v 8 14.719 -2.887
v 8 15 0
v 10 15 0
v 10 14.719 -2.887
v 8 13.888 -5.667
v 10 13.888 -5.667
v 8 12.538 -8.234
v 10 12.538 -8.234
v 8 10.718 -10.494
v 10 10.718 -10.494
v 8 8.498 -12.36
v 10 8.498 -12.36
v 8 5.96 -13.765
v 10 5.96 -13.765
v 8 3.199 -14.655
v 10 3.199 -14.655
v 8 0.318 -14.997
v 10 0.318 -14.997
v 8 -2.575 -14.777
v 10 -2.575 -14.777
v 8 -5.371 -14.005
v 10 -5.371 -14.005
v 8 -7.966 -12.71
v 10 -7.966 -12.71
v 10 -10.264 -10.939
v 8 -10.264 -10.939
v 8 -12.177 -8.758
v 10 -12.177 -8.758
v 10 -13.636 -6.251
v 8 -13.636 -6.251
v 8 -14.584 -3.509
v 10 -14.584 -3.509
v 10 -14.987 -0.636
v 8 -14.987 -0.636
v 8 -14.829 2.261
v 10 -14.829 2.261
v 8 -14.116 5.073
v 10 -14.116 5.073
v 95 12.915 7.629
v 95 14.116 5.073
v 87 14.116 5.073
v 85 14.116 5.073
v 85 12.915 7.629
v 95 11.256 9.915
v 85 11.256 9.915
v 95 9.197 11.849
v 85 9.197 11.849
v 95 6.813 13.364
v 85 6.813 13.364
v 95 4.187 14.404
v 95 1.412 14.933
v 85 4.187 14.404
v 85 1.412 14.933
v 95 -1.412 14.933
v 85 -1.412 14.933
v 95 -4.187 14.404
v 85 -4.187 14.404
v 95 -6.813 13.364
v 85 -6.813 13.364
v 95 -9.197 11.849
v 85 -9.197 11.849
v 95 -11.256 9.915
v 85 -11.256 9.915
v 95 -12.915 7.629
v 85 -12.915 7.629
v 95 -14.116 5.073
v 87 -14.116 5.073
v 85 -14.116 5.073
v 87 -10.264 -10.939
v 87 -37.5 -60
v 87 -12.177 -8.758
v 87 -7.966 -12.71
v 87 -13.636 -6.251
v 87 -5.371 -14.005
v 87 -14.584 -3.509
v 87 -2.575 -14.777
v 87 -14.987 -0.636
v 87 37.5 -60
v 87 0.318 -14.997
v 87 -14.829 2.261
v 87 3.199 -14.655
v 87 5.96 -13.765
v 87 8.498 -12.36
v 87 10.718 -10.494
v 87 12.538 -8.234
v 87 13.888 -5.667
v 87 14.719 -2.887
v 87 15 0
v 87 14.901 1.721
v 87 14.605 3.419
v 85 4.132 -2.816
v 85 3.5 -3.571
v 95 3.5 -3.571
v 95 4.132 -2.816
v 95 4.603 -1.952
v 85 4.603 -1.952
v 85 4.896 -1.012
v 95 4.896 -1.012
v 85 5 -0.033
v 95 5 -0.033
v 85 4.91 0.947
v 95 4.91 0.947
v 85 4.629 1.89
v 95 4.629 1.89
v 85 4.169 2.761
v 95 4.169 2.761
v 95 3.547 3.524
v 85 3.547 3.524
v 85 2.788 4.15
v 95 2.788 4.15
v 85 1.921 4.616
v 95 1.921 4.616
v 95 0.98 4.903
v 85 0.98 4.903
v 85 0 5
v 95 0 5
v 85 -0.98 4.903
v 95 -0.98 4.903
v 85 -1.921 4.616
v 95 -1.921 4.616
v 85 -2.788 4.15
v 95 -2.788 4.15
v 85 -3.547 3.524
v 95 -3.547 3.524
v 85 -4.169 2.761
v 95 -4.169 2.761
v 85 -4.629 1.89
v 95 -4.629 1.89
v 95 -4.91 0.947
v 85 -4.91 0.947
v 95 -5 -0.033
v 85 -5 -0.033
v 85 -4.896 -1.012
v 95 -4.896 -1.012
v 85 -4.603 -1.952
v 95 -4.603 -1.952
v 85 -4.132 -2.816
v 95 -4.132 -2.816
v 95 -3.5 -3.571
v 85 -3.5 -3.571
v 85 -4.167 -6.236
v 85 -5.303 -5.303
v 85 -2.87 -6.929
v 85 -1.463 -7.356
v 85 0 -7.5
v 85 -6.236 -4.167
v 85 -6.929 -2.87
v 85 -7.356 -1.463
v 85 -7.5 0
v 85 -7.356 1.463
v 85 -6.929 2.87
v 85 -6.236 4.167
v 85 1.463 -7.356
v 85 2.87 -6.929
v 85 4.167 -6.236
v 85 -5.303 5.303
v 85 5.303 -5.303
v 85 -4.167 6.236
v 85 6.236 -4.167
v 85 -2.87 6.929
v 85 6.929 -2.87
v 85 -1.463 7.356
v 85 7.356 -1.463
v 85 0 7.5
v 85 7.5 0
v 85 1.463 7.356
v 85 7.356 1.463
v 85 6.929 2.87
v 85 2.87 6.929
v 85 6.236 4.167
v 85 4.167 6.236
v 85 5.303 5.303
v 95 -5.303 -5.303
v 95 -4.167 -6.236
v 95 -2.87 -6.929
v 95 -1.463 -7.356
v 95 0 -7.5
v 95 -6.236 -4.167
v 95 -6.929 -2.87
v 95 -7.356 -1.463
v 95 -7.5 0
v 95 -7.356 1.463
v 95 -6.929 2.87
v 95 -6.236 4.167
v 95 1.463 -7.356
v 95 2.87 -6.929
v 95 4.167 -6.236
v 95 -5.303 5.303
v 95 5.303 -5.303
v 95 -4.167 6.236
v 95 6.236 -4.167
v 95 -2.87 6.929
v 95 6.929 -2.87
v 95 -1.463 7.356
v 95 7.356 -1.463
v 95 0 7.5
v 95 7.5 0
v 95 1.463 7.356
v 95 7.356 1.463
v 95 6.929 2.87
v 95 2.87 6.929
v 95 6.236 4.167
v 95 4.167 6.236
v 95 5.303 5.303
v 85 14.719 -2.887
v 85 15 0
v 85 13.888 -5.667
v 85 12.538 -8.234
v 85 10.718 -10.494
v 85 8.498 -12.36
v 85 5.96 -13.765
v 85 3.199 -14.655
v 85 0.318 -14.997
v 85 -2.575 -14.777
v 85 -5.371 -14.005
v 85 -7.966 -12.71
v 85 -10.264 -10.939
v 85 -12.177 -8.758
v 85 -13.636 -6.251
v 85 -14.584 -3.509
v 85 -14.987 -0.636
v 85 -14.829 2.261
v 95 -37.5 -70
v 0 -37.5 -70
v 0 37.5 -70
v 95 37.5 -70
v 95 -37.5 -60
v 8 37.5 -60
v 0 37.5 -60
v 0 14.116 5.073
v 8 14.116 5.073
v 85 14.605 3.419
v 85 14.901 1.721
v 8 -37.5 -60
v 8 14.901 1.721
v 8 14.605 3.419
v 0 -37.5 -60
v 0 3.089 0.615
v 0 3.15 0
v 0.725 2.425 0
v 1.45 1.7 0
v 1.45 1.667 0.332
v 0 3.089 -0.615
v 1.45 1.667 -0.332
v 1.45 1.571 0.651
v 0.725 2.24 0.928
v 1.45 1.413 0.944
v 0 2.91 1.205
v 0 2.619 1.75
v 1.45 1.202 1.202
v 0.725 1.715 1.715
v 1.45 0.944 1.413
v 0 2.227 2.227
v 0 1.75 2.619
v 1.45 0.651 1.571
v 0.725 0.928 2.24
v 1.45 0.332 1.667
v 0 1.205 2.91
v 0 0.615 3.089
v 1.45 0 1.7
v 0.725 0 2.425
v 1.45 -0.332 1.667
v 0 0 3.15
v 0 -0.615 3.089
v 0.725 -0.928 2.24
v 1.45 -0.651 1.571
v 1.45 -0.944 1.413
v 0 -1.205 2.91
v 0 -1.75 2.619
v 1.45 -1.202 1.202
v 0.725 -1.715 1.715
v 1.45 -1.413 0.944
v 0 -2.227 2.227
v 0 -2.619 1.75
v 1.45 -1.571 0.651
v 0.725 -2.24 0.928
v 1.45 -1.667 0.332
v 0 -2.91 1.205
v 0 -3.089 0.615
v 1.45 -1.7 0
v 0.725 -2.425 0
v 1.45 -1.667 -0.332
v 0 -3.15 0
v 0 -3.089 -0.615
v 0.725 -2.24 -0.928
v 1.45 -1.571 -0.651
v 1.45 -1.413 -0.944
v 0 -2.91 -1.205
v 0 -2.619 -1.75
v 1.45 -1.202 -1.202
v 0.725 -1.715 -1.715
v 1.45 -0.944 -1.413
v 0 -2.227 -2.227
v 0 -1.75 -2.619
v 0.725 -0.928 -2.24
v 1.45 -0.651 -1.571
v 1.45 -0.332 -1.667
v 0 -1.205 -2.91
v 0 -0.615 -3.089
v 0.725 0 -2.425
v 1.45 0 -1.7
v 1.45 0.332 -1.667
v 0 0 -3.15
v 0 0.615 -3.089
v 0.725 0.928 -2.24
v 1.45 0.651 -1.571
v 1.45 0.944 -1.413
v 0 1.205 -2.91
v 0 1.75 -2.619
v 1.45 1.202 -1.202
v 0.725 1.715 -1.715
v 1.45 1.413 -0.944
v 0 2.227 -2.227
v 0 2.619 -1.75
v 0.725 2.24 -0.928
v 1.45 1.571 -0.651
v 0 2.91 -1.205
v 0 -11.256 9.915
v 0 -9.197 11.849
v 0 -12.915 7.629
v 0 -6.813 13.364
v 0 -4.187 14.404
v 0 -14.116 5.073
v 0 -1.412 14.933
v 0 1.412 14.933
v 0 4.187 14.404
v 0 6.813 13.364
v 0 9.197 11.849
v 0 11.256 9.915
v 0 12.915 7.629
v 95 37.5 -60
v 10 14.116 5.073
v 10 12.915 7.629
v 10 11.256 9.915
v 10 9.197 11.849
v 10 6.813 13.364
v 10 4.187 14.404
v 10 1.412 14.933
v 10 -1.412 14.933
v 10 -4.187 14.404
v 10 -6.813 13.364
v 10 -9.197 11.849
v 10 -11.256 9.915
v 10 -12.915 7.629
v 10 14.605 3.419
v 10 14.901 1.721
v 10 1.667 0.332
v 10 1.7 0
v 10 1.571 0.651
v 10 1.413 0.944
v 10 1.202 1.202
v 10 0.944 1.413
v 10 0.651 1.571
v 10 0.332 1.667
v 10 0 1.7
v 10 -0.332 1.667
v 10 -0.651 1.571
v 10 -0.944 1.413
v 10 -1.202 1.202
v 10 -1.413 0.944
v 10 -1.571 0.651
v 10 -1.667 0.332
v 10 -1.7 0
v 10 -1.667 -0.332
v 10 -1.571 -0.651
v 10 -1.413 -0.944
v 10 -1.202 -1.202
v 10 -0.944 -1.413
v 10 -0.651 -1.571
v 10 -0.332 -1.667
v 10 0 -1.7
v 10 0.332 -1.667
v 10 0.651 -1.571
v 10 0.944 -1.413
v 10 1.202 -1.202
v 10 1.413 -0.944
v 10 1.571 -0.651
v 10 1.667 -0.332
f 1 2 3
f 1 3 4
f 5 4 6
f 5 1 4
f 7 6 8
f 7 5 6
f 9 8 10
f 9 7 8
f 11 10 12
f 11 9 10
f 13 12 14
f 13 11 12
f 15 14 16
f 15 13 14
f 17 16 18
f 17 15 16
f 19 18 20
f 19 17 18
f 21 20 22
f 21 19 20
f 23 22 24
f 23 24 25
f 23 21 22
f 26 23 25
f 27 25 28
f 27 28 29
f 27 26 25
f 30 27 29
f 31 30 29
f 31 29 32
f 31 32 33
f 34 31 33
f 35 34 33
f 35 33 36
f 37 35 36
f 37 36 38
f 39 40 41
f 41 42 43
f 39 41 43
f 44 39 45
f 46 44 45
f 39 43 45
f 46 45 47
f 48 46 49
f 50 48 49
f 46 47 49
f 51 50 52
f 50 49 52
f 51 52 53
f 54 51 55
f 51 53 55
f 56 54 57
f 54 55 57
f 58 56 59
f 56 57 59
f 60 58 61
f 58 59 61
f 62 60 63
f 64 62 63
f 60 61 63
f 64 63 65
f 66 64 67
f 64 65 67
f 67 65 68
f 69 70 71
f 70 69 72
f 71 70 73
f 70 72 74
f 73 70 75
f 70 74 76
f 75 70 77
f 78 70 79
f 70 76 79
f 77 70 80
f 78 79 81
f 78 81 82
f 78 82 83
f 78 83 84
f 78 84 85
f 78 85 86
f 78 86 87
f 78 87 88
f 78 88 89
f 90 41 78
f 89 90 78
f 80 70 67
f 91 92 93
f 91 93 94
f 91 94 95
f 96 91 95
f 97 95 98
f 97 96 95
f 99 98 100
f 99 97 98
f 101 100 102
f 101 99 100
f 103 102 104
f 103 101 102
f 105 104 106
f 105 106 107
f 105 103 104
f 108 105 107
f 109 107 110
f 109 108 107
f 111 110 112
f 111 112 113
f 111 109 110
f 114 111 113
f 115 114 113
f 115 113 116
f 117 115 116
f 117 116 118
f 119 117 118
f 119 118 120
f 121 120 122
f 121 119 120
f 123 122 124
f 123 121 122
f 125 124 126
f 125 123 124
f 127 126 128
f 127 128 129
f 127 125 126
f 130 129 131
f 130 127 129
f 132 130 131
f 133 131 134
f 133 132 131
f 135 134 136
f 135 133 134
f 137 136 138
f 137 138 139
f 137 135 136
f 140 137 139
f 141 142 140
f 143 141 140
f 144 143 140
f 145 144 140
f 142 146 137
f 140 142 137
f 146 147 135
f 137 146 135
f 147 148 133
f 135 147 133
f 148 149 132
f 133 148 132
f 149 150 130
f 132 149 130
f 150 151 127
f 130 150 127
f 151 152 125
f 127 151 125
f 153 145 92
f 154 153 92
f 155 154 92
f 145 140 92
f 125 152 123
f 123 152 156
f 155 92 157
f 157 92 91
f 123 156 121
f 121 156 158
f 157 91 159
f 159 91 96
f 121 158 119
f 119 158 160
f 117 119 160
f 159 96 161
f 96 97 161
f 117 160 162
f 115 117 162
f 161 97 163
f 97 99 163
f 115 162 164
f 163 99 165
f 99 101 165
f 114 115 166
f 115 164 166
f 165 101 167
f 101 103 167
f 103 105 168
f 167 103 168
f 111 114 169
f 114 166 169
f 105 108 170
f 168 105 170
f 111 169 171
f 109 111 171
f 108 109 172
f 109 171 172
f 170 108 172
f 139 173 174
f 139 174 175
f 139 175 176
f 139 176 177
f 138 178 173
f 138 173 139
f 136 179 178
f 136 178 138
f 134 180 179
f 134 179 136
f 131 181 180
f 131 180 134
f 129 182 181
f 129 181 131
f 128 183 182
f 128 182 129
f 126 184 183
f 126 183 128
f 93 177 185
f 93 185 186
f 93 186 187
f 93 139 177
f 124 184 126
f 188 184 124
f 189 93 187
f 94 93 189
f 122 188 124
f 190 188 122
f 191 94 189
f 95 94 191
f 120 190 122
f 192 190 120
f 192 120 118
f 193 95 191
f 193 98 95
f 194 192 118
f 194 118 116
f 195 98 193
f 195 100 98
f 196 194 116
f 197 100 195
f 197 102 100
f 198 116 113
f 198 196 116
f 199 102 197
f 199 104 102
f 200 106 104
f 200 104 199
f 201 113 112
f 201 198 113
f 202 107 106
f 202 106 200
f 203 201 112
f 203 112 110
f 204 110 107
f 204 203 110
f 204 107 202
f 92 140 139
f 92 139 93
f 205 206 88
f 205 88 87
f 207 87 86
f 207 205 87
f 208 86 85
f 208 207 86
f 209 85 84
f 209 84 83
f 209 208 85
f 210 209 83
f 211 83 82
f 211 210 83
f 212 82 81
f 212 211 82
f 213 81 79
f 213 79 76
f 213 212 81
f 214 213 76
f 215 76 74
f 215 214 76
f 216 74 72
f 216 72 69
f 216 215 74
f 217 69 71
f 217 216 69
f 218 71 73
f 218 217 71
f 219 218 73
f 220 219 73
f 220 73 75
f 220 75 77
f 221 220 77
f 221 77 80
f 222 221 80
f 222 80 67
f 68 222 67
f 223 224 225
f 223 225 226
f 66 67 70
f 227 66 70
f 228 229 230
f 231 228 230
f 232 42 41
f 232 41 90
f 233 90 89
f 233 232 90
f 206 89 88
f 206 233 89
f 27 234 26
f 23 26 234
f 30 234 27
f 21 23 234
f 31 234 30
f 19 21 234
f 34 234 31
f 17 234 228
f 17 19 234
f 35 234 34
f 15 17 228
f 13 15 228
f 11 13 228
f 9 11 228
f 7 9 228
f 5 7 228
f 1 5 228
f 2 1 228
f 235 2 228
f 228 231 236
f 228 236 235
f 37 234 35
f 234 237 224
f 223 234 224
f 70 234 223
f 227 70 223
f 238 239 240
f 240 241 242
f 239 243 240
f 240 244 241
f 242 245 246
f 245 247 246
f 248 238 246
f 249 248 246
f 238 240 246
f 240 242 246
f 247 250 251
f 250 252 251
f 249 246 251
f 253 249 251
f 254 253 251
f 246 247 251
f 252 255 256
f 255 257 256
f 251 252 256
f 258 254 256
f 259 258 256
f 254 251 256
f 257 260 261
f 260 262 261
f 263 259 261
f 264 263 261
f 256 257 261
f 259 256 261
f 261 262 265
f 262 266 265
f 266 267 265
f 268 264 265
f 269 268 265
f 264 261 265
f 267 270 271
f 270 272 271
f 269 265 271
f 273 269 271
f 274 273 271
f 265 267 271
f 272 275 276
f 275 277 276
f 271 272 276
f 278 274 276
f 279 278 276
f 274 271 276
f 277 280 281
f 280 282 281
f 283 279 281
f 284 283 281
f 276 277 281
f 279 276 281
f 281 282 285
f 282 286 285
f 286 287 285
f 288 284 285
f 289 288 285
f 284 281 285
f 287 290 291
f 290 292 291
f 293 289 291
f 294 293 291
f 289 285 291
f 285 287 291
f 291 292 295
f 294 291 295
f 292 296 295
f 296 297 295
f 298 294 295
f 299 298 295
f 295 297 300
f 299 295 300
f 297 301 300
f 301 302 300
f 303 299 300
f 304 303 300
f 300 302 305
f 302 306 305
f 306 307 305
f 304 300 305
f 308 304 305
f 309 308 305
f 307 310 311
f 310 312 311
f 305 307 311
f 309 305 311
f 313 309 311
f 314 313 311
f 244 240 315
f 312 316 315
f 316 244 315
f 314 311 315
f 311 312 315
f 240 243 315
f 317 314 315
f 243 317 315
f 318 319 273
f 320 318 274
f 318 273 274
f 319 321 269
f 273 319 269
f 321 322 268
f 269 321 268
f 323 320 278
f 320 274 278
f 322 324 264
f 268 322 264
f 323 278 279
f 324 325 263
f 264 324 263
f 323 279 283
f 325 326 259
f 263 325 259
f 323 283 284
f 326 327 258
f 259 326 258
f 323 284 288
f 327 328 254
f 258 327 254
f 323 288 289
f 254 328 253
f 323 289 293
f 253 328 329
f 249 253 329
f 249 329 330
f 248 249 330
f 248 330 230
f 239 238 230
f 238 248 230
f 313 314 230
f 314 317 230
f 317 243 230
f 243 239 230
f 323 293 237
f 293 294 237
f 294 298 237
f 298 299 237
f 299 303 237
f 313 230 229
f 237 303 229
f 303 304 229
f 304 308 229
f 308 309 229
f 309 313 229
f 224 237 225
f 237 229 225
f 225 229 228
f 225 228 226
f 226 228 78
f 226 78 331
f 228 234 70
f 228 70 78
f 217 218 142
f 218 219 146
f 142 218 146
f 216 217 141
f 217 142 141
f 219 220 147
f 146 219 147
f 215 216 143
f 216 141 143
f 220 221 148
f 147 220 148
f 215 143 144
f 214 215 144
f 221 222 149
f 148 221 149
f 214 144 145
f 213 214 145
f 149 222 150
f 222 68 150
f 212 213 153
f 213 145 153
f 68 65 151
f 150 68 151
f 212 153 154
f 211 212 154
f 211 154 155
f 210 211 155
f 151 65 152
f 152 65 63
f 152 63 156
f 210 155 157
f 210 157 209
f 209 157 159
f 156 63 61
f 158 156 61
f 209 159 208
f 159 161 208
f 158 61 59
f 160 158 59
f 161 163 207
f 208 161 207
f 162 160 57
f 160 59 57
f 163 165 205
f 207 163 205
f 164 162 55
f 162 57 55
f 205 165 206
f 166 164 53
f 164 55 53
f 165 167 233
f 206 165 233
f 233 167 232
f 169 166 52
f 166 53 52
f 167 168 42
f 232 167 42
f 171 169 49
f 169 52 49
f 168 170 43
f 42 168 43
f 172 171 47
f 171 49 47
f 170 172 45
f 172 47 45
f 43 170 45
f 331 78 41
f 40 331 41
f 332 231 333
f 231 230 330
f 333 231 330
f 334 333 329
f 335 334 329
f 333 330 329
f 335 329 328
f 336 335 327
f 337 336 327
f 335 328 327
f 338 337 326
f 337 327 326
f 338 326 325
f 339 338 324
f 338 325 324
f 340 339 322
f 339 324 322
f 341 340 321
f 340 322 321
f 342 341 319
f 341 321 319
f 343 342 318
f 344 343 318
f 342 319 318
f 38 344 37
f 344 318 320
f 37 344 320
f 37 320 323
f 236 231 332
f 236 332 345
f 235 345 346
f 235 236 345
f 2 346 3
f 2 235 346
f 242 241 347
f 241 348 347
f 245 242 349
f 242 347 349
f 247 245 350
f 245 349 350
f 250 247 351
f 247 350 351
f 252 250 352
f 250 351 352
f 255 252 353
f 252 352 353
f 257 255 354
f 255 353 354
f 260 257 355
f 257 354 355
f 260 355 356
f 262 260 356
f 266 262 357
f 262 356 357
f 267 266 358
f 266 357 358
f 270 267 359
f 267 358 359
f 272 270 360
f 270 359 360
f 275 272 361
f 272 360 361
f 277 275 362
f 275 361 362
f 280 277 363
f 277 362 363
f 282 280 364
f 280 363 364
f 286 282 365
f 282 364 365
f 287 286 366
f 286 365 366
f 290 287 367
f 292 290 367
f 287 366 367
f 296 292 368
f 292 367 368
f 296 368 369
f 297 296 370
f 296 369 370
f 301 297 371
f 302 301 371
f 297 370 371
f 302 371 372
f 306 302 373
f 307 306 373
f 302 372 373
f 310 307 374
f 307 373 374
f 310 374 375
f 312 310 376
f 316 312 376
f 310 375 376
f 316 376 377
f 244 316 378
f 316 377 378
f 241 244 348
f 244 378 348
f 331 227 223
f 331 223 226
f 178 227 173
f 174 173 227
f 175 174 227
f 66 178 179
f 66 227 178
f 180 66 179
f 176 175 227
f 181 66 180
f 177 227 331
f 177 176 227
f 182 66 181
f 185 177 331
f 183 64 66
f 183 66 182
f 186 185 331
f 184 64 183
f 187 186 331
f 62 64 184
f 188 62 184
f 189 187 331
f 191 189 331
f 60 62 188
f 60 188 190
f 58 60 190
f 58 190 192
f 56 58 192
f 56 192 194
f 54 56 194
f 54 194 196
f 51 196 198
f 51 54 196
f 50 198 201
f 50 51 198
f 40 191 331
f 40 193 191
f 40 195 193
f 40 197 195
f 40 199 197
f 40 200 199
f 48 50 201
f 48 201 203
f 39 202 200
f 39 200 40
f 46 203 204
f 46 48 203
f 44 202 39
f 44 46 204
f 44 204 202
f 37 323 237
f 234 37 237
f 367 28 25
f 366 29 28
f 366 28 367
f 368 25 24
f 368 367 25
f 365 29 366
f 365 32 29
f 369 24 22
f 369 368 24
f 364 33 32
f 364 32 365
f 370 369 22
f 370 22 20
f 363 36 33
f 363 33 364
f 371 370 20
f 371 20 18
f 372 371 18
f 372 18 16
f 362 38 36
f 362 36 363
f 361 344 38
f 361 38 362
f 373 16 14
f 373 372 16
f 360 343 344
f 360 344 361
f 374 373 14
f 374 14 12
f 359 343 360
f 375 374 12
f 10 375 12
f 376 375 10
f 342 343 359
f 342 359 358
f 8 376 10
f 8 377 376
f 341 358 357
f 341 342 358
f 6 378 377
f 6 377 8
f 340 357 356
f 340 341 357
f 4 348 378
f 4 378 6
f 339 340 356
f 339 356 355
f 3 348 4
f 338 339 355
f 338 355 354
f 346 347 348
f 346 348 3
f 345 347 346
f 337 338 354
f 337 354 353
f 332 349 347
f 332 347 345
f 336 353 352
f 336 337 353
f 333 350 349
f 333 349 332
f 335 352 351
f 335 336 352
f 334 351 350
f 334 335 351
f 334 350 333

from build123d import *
from build123d.topology import SkipClean

# Parameters (mm, degrees)
SKETCH1_R                                       = 7.5
BOSS_EXTRUDE1_DEPTH                             = 10
SKETCH2_W                                       = 95
SKETCH2_H                                       = 75
BOSS_EXTRUDE2_DEPTH                             = 10
LPATTERN1_COUNT                                 = 2
LPATTERN1_PITCH                                 = 85
CUT_EXTRUDE2_DEPTH                              = 77
CUT_EXTRUDE2_DEPTH_BACK                         = 2
SKETCH5_R                                       = 7.5
SKETCH5_R_2                                     = 1
BOSS_EXTRUDE4_DEPTH                             = 10
CSK_FOR_M3_FLAT_HEAD_MACHINE_SCREW1_D           = 3.4
CSK_FOR_M3_FLAT_HEAD_MACHINE_SCREW1_DEPTH       = 95
CSK_FOR_M3_FLAT_HEAD_MACHINE_SCREW1_CSINK_D     = 6.3
CSK_FOR_M3_FLAT_HEAD_MACHINE_SCREW1_CSINK_ANGLE = 90
BOSS_EXTRUDE5_START                             = -10
SKETCH10_R                                      = 7.5
BOSS_EXTRUDE5_DEPTH                             = 10


with BuildPart() as part:
    # Sketch1 → Boss-Extrude1 (new body)
    with BuildSketch(Plane.YZ):
        with BuildLine():
            Line((-14.116239718, 5.072649824), (-37.5, -60))
            Line((-37.5, -60), (37.5, -60))
            Line((37.5, -60), (14.116239718, 5.072649824))
            ThreePointArc((14.116239718, 5.072649824), (0, 15), (-14.116239718, 5.072649824))
        make_face()
        with Locations(Location((0, 0, 0), (0, 0, 270))):
            Circle(SKETCH1_R, mode=Mode.SUBTRACT)
    boss_extrude1 = extrude(amount=BOSS_EXTRUDE1_DEPTH)

    # Sketch2 → Boss-Extrude2 (add)
    with BuildSketch(Plane(origin=(0, 0, -60), x_dir=(1, 0, 0), z_dir=(0, 0, -1))):
        with Locations((47.5, 0)):
            Rectangle(SKETCH2_W, SKETCH2_H)
    extrude(amount=BOSS_EXTRUDE2_DEPTH)

    # LPattern1: Boss-Extrude1 ×2
    with Locations(*[(i * LPATTERN1_PITCH, 0, 0) for i in range(1, LPATTERN1_COUNT)]):
        add(boss_extrude1)

    # Sketch4 → Cut-Extrude2 (cut, two sides: drawn at the far end of the back side and taken through both)
    with SkipClean():  # the faces are left unmerged after this step: merging them gives an invalid solid
        with BuildSketch(Plane.YZ.offset(10).offset(-CUT_EXTRUDE2_DEPTH_BACK)):
            with BuildLine():
                Line((-37.5, -60), (37.5, -60))
                Line((37.5, -60), (14.116239718, 5.072649824))
                ThreePointArc((14.116239718, 5.072649824), (14.777408362, 2.574529494), (15, 0))
                ThreePointArc((15, 0), (-2.574529494, -14.777408362), (-14.116239718, 5.072649824))
                Line((-14.116239718, 5.072649824), (-37.5, -60))
            make_face()
        extrude(amount=CUT_EXTRUDE2_DEPTH + CUT_EXTRUDE2_DEPTH_BACK, mode=Mode.SUBTRACT)

    # Sketch5 → Boss-Extrude4 (add)
    with SkipClean():  # the faces are left unmerged after this step: merging them gives an invalid solid
        with BuildSketch(Plane.YZ):
            with Locations(Location((0, 0, 0), (0, 0, 270))):
                Circle(SKETCH5_R)
            with Locations(Location((0, 0, 0), (0, 0, 270))):
                Circle(SKETCH5_R_2, mode=Mode.SUBTRACT)
        extrude(amount=BOSS_EXTRUDE4_DEPTH)

    # CSK for M3 Flat Head Machine Screw1
    with Locations(Plane(origin=(0, 0, 0), x_dir=(0, -1, 0), z_dir=(-1, 0, 0))):
        with Locations((0, 0)):
            CounterSinkHole(CSK_FOR_M3_FLAT_HEAD_MACHINE_SCREW1_D / 2, CSK_FOR_M3_FLAT_HEAD_MACHINE_SCREW1_CSINK_D / 2, depth=CSK_FOR_M3_FLAT_HEAD_MACHINE_SCREW1_DEPTH, counter_sink_angle=CSK_FOR_M3_FLAT_HEAD_MACHINE_SCREW1_CSINK_ANGLE)

    # Sketch10 → Boss-Extrude5 (add)
    with SkipClean():  # the faces are left unmerged after this step: merging them gives an invalid solid
        with BuildSketch(Plane.YZ.offset(95).offset(BOSS_EXTRUDE5_START)):
            Circle(SKETCH10_R)
            with BuildLine():
                Line((-3.5, -3.570714214), (3.5, -3.570714214))
                ThreePointArc((3.5, -3.570714214), (0, 5), (-3.5, -3.570714214))
            make_face(mode=Mode.SUBTRACT)
        extrude(amount=BOSS_EXTRUDE5_DEPTH)


solid = part.part
